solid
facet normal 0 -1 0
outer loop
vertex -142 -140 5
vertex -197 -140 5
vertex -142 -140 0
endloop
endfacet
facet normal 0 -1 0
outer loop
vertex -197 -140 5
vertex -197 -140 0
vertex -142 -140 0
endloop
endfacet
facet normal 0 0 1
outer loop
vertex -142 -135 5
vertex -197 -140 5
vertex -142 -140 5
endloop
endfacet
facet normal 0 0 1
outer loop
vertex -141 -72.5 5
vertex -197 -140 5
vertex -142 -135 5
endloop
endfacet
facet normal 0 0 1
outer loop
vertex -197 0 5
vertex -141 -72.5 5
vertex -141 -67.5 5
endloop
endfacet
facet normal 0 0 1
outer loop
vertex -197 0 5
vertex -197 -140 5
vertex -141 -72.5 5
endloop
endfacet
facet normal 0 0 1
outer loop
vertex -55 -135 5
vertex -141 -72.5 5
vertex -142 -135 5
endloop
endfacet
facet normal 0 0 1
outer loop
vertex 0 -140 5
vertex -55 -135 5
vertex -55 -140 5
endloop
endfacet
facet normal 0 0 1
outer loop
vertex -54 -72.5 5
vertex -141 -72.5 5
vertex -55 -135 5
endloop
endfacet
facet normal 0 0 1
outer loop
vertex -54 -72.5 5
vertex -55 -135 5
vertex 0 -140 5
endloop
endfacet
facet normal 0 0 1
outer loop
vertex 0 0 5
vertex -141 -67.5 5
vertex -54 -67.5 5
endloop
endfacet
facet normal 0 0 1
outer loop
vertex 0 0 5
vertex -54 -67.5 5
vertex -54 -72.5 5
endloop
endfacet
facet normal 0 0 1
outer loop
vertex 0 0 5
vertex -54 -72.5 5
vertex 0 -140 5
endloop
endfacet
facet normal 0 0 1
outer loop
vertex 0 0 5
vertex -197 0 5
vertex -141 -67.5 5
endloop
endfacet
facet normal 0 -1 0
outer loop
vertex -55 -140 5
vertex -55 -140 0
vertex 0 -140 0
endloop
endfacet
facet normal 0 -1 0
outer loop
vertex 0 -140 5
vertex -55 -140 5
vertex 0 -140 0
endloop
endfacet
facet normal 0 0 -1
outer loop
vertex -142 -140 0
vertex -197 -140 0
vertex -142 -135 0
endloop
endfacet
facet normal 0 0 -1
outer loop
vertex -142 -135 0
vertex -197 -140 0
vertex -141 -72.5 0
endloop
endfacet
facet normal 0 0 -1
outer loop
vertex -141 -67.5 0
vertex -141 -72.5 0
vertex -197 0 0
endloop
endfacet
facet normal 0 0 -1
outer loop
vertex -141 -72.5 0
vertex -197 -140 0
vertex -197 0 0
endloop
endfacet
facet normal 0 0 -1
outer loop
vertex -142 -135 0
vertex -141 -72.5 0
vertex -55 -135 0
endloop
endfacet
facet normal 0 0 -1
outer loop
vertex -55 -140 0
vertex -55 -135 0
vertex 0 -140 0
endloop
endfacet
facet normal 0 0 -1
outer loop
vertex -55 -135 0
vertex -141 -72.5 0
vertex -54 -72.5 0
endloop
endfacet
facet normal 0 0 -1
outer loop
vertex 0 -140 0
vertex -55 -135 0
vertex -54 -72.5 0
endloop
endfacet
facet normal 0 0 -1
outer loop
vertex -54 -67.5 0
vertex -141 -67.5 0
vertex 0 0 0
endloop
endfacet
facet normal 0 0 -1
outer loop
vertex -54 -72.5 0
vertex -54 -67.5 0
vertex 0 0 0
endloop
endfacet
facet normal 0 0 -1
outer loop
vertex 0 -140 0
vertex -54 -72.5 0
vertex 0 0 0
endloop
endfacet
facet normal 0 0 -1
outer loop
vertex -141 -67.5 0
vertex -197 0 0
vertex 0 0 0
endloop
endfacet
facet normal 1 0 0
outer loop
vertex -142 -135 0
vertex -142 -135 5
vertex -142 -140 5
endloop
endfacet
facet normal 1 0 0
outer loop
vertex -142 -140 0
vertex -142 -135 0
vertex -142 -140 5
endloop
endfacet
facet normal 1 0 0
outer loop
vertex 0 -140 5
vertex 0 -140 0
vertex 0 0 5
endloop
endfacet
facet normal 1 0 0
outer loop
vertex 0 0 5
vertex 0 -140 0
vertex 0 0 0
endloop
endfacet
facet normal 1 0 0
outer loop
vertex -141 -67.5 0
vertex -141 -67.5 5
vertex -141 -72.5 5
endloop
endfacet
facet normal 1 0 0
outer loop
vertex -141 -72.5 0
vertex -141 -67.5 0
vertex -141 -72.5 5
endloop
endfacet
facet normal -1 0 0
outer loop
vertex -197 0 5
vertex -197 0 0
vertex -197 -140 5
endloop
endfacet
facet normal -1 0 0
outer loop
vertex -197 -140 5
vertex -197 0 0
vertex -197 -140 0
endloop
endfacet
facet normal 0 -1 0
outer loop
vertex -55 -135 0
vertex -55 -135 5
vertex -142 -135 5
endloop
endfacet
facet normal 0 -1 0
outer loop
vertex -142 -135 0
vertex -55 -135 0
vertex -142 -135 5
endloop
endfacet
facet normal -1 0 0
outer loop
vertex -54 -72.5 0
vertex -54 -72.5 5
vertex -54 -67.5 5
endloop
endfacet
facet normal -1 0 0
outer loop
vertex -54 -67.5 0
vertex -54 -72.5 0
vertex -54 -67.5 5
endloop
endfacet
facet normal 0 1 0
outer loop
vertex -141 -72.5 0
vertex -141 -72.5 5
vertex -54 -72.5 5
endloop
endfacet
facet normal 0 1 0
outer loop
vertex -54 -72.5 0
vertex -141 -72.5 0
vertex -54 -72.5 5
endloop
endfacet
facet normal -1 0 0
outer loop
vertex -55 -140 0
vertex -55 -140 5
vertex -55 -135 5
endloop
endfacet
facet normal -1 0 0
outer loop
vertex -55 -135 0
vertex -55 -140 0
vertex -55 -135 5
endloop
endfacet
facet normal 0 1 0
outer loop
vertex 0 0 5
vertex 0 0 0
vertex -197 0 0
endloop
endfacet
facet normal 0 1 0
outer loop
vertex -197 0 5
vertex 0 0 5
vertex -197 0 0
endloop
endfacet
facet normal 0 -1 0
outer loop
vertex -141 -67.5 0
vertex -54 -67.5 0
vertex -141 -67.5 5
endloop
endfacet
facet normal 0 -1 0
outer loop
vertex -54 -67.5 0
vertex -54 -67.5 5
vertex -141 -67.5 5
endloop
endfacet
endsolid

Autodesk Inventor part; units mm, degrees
ref_plane "YZ Plane" through (0, 0, 0) normal (1, 0, 0) x (0, 1, 0)
ref_plane "XZ Plane" through (0, 0, 0) normal (0, 1, 0) x (-1, 0, 0)
ref_plane "XY Plane" through (0, 0, 0) normal (0, 0, 1) x (1, 0, 0)
sketch "Sketch1" plane through (0, 0, 0) normal (0, 0, 1) x (1, 0, 0)
  line L0 (0, 0) -> (-197, 0)
  line L1 (-197, 0) -> (-197, -140)
  line L2 (-197, -140) -> (0, -140)
  line L3 (0, -140) -> (0, 0)
  dimension "d0" = 140
  dimension "d1" = 197
extrude "Extrusion1" add sketch "Sketch1" along normal blind 5
sketch "Sketch3" plane through (0, 0, 5) normal (0, 0, 1) x (1, 0, 0)
  line L0 (0, 0) -> (-197, 0) projected
  line L1 (0, -140) -> (0, 0) projected
  line L2 (-197, -140) -> (0, -140) projected
  line L3 (-197, 0) -> (-197, -140) projected
  line L4 (-142, -140) -> (-55, -140)
  line L5 (-55, -140) -> (-55, -135)
  line L6 (-55, -135) -> (-142, -135)
  line L7 (-142, -135) -> (-142, -140)
  line L8 (-141, -72.5) -> (-54, -72.5)
  line L9 (-54, -72.5) -> (-54, -67.5)
  line L10 (-54, -67.5) -> (-141, -67.5)
  line L11 (-141, -67.5) -> (-141, -72.5)
  point P0 (-55, -140)
  dimension "d13" = 5
  dimension "d14" = 55
  dimension "d15" = 55
  dimension "d16" = 5
  dimension "d17" = 72.5
extrude "Extrusion3" cut sketch "Sketch3" against normal blind 5 contours L2 L7 L6 L5 | L11 L10 L9 L8
properties part number "Frente"
